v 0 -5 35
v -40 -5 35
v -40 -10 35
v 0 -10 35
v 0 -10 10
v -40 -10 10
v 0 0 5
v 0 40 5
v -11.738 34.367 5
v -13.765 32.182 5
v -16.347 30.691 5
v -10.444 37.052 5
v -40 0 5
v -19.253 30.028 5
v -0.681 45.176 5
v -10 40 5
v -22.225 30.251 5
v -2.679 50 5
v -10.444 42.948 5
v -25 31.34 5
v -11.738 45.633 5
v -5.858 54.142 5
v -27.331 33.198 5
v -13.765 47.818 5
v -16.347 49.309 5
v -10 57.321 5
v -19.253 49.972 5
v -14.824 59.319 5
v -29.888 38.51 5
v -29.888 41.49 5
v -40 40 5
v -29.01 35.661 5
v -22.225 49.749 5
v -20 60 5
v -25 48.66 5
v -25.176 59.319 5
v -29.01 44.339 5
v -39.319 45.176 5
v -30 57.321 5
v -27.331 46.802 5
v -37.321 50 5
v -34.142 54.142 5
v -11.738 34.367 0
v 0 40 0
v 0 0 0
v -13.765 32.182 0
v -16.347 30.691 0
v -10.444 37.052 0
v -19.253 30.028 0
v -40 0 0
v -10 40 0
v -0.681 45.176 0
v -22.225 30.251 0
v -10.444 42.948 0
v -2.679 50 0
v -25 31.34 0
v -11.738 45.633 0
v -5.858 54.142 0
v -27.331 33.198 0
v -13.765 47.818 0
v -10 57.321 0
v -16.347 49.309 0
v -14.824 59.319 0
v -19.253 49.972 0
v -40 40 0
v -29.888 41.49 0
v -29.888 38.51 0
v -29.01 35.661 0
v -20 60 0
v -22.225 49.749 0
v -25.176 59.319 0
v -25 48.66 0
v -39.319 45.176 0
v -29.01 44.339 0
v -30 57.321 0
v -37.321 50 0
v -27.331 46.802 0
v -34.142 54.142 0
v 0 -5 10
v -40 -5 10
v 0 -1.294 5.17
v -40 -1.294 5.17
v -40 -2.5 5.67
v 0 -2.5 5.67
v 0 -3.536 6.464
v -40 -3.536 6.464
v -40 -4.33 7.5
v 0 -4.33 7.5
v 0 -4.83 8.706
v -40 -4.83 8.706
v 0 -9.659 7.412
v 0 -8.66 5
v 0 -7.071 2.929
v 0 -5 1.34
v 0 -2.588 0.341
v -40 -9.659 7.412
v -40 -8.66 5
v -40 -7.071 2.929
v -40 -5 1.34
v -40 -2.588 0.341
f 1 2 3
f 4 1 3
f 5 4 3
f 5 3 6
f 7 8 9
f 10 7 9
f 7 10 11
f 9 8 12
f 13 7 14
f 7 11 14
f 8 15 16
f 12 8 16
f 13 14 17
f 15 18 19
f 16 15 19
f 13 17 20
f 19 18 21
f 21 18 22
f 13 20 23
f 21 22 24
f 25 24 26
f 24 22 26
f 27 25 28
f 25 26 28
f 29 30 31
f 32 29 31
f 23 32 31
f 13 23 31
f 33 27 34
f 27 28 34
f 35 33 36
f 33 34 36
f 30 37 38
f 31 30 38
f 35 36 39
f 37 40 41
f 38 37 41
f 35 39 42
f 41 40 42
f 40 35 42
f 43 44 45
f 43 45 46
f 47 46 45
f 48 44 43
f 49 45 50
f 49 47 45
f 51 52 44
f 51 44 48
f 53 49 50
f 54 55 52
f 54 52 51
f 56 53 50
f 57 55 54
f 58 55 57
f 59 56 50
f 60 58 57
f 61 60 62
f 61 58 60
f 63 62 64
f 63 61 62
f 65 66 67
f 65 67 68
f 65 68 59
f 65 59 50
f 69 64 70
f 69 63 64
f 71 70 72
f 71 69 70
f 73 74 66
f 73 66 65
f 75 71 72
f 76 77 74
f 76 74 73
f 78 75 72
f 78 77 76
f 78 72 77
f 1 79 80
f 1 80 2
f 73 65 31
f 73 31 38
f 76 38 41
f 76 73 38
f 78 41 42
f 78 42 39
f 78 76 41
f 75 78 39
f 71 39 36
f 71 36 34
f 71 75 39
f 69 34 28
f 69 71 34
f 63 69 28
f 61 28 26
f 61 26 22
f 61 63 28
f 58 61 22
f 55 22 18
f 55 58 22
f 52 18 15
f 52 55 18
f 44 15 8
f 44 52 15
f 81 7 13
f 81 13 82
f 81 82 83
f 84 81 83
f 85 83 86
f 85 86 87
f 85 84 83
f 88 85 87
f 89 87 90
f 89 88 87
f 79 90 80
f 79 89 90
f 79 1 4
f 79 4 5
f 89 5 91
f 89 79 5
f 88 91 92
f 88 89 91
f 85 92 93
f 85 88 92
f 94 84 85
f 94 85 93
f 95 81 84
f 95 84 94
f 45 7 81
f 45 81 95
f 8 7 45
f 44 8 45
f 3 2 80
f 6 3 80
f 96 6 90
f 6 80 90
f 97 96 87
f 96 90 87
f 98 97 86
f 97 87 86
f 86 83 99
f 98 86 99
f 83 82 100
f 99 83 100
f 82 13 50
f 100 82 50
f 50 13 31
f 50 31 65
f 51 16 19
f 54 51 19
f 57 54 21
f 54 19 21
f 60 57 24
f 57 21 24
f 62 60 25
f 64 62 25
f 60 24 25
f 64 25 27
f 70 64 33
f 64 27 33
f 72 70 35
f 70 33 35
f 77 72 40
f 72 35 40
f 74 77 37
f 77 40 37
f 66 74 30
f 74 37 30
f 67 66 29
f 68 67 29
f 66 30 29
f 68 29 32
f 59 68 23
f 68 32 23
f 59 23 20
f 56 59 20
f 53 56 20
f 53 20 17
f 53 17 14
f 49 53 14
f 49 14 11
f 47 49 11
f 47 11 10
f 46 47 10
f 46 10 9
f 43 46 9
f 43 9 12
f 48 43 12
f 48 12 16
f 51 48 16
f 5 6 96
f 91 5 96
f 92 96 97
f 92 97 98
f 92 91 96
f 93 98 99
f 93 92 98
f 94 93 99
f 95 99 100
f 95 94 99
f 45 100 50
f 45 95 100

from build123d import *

# Parameters (mm, degrees)
EXTRUDE1_DEPTH      = 5
SKETCH2_R           = 10
CUT_EXTRUDE1_DEPTH  = 6
BOSS_EXTRUDE1_DEPTH = 40


with BuildPart() as part:
    # Sketch1 → Extrude1 (new body)
    with BuildSketch(Plane.XY):
        with BuildLine():
            Line((0, 40), (0, 0))
            Line((0, 0), (-40, 0))
            Line((-40, 0), (-40, 40))
            ThreePointArc((-40, 40), (-20, 60), (0, 40))
        make_face()
    extrude(amount=EXTRUDE1_DEPTH)

    # Sketch2 → Cut-Extrude1 (cut, through all)
    with BuildSketch(Plane.XY.offset(5)):
        with Locations((-20, 40)):
            Circle(SKETCH2_R)
    extrude(amount=-CUT_EXTRUDE1_DEPTH, mode=Mode.SUBTRACT)

    # Sketch3 → Boss-Extrude1 (add)
    with BuildSketch(Plane(origin=(0, 0, 0), x_dir=(0, 0, -1), z_dir=(1, 0, 0))):
        with BuildLine():
            Line((-10, -5), (-35, -5))
            Line((-35, -5), (-35, -10))
            Line((-35, -10), (-10, -10))
            ThreePointArc((-10, -10), (-2.928932188, -7.071067812), (0, 0))
            Line((0, 0), (-5, 0))
            ThreePointArc((-5, 0), (-6.464466094, -3.535533906), (-10, -5))
        make_face()
    extrude(amount=-BOSS_EXTRUDE1_DEPTH)


solid = part.part
